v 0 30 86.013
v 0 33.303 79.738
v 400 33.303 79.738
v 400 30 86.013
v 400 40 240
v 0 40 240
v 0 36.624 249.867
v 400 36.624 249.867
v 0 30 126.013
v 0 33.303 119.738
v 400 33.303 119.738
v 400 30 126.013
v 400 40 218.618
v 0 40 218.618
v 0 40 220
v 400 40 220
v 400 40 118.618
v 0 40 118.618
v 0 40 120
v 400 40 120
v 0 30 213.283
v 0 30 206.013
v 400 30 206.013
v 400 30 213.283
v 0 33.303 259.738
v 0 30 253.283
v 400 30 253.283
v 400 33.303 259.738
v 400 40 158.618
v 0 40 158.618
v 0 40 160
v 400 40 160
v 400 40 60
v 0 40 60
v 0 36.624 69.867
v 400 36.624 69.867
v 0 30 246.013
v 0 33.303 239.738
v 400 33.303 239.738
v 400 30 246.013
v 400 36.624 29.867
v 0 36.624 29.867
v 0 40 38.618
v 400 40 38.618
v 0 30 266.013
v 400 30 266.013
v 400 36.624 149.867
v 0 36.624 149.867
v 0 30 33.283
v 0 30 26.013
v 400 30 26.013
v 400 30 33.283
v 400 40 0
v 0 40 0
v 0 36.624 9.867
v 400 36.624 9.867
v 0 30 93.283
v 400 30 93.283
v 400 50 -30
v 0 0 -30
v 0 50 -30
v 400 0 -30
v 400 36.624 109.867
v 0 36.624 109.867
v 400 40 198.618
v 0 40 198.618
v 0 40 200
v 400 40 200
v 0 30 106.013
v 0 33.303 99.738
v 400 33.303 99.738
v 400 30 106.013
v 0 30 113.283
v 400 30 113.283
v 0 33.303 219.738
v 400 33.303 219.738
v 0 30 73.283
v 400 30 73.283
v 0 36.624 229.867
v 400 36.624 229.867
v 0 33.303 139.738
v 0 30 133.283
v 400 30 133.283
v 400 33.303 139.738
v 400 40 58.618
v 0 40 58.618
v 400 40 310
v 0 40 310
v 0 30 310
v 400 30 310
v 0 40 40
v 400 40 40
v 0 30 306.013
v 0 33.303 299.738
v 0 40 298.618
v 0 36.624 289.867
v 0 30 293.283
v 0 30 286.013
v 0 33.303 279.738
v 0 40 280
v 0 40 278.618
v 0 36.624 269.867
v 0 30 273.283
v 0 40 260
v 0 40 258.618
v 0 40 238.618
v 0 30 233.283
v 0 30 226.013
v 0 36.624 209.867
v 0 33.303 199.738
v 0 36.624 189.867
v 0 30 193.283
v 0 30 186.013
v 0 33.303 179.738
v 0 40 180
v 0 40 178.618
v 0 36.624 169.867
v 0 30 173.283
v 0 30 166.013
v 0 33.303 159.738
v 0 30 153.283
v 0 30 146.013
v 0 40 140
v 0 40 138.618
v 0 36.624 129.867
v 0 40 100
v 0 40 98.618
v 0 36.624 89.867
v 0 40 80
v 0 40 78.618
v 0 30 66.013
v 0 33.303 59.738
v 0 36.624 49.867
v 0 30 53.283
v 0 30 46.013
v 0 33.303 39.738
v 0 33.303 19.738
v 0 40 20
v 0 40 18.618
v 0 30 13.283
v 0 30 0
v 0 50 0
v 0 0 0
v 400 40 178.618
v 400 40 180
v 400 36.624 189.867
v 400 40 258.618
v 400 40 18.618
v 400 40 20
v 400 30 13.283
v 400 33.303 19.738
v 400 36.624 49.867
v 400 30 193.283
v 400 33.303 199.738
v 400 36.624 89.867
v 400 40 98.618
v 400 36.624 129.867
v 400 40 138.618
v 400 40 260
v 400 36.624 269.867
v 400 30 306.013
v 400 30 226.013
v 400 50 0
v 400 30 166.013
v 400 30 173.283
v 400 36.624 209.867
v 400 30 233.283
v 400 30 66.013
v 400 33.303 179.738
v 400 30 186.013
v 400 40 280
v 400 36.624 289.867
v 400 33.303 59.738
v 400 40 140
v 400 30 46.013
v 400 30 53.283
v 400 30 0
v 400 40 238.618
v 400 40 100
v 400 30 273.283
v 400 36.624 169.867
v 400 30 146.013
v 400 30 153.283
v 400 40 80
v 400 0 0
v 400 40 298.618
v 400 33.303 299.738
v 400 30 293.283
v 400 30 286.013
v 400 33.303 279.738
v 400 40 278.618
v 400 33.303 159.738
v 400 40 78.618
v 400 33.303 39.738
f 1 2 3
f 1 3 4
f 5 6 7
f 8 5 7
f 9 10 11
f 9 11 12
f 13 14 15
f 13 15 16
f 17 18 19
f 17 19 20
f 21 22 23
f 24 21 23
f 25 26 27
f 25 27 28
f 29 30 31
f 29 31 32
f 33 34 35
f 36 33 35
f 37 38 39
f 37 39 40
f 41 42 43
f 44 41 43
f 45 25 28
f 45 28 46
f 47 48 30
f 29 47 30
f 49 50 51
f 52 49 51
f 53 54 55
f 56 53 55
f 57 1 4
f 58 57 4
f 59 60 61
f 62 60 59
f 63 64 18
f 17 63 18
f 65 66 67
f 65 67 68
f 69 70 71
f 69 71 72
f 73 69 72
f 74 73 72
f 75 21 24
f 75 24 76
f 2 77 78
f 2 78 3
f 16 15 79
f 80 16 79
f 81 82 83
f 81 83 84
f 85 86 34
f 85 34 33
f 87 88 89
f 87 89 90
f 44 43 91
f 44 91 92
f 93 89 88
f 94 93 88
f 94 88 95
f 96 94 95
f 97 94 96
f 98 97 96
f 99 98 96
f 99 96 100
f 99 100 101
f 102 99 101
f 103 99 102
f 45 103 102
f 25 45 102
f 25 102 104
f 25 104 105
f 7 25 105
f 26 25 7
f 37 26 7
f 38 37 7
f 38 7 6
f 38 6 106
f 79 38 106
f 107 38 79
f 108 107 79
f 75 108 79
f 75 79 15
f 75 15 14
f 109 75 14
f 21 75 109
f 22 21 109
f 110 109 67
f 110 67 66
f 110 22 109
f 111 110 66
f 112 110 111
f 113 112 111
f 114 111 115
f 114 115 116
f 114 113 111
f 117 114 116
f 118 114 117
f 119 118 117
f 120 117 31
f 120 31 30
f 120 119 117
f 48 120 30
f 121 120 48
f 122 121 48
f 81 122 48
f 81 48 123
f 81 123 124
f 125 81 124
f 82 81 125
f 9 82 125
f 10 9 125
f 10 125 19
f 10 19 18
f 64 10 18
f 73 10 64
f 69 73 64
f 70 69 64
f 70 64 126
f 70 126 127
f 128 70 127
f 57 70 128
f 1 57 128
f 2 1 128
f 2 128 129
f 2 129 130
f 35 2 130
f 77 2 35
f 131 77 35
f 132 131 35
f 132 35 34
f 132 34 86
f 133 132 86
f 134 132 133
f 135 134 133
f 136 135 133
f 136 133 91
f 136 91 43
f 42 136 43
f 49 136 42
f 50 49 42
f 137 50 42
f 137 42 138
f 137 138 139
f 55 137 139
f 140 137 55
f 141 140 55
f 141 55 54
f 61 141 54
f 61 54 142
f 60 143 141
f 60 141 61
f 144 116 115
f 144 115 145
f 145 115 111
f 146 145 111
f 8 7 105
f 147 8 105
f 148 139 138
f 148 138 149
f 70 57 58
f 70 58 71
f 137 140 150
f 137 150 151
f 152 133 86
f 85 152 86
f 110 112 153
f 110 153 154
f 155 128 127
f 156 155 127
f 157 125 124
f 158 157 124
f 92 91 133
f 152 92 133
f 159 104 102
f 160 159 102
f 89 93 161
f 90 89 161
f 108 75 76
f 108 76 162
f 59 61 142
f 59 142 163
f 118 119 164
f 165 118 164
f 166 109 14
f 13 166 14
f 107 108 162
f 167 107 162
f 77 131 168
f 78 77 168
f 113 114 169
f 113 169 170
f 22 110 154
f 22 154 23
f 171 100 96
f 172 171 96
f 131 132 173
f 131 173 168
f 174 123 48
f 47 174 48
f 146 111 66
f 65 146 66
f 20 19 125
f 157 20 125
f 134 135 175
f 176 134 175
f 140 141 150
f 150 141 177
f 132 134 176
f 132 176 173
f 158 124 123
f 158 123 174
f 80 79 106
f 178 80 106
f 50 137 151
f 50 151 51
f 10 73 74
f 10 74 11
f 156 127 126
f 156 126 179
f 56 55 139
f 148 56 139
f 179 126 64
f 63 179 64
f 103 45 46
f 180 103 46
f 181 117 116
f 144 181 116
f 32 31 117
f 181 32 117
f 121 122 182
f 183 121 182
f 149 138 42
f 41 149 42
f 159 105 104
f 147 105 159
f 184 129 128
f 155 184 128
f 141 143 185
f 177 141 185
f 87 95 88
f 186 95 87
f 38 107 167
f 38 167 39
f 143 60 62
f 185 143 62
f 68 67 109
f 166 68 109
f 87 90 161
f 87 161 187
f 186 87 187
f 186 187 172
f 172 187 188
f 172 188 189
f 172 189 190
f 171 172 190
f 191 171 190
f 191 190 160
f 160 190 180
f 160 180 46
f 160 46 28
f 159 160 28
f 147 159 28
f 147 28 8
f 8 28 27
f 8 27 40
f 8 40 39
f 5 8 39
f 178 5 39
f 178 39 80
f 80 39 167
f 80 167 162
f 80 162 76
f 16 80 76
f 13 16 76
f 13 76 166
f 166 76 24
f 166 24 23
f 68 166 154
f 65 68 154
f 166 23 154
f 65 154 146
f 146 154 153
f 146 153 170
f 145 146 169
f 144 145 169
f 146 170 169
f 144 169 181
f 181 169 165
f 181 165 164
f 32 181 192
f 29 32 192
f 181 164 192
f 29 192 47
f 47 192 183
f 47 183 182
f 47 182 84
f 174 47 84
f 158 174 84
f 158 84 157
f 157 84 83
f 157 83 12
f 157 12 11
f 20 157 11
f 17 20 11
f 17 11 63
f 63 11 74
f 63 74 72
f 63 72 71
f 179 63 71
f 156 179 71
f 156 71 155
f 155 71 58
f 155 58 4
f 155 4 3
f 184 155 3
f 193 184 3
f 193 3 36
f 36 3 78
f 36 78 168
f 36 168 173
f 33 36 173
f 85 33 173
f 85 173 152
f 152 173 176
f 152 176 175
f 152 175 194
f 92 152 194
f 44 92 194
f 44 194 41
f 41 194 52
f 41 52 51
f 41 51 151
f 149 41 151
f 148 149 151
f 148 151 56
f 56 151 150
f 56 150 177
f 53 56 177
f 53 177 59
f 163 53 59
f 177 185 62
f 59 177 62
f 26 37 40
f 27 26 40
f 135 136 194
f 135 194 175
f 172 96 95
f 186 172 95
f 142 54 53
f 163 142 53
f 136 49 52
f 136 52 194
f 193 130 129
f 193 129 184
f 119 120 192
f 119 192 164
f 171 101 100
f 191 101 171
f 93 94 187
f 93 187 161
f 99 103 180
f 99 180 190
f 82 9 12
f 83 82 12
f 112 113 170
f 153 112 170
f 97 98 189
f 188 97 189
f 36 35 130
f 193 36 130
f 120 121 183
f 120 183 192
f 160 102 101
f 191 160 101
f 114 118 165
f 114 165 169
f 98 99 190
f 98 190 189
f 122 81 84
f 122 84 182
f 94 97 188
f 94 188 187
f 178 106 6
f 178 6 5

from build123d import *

# Parameters (mm, degrees)
SKETCH1_W           = 400
SKETCH1_H           = 30
BOSS_EXTRUDE1_DEPTH = 50
SKETCH2_W           = 400
SKETCH2_H           = 10
BOSS_EXTRUDE2_DEPTH = 310
CUT_EXTRUDE1_DEPTH  = 400
LPATTERN1_COUNT     = 15
LPATTERN1_PITCH     = 20


with BuildPart() as part:
    # Sketch1 → Boss-Extrude1 (new body)
    with BuildSketch(Plane(origin=(0, 0, 0), x_dir=(1, 0, 0), z_dir=(0, 1, 0))):
        with Locations((200, 15)):
            Rectangle(SKETCH1_W, SKETCH1_H)
    extrude(amount=BOSS_EXTRUDE1_DEPTH)

    # Sketch2 → Boss-Extrude2 (add)
    with BuildSketch(Plane.XY):
        with Locations((200, 35)):
            Rectangle(SKETCH2_W, SKETCH2_H)
    extrude(amount=BOSS_EXTRUDE2_DEPTH)

    # Sketch3 → Cut-Extrude1 (cut)
    with BuildSketch(Plane.ZY):
        Polygon((0, 40), (9.867375243, 36.624338333), (18.617949732, 40), align=None)
        Polygon((13.283352971, 30), (19.738366334, 33.302751996), (26.012819883, 30), align=None)
    cut_extrude1 = extrude(amount=-CUT_EXTRUDE1_DEPTH, mode=Mode.SUBTRACT)

    # LPattern1: Cut-Extrude1 ×15
    with Locations(*[(0, 0, i * LPATTERN1_PITCH) for i in range(1, LPATTERN1_COUNT)]):
        add(cut_extrude1, mode=Mode.SUBTRACT)


solid = part.part
